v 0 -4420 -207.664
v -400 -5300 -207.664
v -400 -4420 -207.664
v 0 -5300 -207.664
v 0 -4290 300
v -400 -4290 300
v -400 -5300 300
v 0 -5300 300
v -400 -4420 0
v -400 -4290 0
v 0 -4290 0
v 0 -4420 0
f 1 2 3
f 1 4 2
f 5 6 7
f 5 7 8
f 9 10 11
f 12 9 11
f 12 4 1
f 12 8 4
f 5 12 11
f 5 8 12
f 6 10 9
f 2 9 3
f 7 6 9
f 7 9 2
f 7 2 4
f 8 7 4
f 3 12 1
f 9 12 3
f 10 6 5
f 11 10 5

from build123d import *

# Parameters (mm, degrees)
SKETCH1_W           = 400
SKETCH1_H           = 300
BOSS_EXTRUDE1_DEPTH = 1010


with BuildPart() as part:
    # Sketch1 → Boss-Extrude1 (new body)
    with BuildSketch(Plane.XZ.offset(4290)):
        with Locations((-200, 150)):
            Rectangle(SKETCH1_W, SKETCH1_H)
    extrude(amount=BOSS_EXTRUDE1_DEPTH)

    # Sketch2 → Loft1 section 0
    with BuildSketch(Plane(origin=(0, 0, -207.664317166), x_dir=(-1, 0, 0), z_dir=(0, 0, -1))):
        with BuildLine():
            Line((400, -5300), (0, -5300))
            Line((0, -5300), (0, -4420))
            Line((0, -4420), (400, -4420))
            Line((400, -4420), (400, -5300))
        make_face()
    # Sketch4 → Loft1 section 1
    with BuildSketch(Plane(origin=(0, 0, 0), x_dir=(-1, 0, 0), z_dir=(0, 0, -1))):
        with BuildLine():
            Line((0, -5300), (400, -5300))
            Line((400, -5300), (400, -4420))
            Line((400, -4420), (0, -4420))
            Line((0, -4420), (0, -5300))
        make_face()
    loft()


solid = part.part
